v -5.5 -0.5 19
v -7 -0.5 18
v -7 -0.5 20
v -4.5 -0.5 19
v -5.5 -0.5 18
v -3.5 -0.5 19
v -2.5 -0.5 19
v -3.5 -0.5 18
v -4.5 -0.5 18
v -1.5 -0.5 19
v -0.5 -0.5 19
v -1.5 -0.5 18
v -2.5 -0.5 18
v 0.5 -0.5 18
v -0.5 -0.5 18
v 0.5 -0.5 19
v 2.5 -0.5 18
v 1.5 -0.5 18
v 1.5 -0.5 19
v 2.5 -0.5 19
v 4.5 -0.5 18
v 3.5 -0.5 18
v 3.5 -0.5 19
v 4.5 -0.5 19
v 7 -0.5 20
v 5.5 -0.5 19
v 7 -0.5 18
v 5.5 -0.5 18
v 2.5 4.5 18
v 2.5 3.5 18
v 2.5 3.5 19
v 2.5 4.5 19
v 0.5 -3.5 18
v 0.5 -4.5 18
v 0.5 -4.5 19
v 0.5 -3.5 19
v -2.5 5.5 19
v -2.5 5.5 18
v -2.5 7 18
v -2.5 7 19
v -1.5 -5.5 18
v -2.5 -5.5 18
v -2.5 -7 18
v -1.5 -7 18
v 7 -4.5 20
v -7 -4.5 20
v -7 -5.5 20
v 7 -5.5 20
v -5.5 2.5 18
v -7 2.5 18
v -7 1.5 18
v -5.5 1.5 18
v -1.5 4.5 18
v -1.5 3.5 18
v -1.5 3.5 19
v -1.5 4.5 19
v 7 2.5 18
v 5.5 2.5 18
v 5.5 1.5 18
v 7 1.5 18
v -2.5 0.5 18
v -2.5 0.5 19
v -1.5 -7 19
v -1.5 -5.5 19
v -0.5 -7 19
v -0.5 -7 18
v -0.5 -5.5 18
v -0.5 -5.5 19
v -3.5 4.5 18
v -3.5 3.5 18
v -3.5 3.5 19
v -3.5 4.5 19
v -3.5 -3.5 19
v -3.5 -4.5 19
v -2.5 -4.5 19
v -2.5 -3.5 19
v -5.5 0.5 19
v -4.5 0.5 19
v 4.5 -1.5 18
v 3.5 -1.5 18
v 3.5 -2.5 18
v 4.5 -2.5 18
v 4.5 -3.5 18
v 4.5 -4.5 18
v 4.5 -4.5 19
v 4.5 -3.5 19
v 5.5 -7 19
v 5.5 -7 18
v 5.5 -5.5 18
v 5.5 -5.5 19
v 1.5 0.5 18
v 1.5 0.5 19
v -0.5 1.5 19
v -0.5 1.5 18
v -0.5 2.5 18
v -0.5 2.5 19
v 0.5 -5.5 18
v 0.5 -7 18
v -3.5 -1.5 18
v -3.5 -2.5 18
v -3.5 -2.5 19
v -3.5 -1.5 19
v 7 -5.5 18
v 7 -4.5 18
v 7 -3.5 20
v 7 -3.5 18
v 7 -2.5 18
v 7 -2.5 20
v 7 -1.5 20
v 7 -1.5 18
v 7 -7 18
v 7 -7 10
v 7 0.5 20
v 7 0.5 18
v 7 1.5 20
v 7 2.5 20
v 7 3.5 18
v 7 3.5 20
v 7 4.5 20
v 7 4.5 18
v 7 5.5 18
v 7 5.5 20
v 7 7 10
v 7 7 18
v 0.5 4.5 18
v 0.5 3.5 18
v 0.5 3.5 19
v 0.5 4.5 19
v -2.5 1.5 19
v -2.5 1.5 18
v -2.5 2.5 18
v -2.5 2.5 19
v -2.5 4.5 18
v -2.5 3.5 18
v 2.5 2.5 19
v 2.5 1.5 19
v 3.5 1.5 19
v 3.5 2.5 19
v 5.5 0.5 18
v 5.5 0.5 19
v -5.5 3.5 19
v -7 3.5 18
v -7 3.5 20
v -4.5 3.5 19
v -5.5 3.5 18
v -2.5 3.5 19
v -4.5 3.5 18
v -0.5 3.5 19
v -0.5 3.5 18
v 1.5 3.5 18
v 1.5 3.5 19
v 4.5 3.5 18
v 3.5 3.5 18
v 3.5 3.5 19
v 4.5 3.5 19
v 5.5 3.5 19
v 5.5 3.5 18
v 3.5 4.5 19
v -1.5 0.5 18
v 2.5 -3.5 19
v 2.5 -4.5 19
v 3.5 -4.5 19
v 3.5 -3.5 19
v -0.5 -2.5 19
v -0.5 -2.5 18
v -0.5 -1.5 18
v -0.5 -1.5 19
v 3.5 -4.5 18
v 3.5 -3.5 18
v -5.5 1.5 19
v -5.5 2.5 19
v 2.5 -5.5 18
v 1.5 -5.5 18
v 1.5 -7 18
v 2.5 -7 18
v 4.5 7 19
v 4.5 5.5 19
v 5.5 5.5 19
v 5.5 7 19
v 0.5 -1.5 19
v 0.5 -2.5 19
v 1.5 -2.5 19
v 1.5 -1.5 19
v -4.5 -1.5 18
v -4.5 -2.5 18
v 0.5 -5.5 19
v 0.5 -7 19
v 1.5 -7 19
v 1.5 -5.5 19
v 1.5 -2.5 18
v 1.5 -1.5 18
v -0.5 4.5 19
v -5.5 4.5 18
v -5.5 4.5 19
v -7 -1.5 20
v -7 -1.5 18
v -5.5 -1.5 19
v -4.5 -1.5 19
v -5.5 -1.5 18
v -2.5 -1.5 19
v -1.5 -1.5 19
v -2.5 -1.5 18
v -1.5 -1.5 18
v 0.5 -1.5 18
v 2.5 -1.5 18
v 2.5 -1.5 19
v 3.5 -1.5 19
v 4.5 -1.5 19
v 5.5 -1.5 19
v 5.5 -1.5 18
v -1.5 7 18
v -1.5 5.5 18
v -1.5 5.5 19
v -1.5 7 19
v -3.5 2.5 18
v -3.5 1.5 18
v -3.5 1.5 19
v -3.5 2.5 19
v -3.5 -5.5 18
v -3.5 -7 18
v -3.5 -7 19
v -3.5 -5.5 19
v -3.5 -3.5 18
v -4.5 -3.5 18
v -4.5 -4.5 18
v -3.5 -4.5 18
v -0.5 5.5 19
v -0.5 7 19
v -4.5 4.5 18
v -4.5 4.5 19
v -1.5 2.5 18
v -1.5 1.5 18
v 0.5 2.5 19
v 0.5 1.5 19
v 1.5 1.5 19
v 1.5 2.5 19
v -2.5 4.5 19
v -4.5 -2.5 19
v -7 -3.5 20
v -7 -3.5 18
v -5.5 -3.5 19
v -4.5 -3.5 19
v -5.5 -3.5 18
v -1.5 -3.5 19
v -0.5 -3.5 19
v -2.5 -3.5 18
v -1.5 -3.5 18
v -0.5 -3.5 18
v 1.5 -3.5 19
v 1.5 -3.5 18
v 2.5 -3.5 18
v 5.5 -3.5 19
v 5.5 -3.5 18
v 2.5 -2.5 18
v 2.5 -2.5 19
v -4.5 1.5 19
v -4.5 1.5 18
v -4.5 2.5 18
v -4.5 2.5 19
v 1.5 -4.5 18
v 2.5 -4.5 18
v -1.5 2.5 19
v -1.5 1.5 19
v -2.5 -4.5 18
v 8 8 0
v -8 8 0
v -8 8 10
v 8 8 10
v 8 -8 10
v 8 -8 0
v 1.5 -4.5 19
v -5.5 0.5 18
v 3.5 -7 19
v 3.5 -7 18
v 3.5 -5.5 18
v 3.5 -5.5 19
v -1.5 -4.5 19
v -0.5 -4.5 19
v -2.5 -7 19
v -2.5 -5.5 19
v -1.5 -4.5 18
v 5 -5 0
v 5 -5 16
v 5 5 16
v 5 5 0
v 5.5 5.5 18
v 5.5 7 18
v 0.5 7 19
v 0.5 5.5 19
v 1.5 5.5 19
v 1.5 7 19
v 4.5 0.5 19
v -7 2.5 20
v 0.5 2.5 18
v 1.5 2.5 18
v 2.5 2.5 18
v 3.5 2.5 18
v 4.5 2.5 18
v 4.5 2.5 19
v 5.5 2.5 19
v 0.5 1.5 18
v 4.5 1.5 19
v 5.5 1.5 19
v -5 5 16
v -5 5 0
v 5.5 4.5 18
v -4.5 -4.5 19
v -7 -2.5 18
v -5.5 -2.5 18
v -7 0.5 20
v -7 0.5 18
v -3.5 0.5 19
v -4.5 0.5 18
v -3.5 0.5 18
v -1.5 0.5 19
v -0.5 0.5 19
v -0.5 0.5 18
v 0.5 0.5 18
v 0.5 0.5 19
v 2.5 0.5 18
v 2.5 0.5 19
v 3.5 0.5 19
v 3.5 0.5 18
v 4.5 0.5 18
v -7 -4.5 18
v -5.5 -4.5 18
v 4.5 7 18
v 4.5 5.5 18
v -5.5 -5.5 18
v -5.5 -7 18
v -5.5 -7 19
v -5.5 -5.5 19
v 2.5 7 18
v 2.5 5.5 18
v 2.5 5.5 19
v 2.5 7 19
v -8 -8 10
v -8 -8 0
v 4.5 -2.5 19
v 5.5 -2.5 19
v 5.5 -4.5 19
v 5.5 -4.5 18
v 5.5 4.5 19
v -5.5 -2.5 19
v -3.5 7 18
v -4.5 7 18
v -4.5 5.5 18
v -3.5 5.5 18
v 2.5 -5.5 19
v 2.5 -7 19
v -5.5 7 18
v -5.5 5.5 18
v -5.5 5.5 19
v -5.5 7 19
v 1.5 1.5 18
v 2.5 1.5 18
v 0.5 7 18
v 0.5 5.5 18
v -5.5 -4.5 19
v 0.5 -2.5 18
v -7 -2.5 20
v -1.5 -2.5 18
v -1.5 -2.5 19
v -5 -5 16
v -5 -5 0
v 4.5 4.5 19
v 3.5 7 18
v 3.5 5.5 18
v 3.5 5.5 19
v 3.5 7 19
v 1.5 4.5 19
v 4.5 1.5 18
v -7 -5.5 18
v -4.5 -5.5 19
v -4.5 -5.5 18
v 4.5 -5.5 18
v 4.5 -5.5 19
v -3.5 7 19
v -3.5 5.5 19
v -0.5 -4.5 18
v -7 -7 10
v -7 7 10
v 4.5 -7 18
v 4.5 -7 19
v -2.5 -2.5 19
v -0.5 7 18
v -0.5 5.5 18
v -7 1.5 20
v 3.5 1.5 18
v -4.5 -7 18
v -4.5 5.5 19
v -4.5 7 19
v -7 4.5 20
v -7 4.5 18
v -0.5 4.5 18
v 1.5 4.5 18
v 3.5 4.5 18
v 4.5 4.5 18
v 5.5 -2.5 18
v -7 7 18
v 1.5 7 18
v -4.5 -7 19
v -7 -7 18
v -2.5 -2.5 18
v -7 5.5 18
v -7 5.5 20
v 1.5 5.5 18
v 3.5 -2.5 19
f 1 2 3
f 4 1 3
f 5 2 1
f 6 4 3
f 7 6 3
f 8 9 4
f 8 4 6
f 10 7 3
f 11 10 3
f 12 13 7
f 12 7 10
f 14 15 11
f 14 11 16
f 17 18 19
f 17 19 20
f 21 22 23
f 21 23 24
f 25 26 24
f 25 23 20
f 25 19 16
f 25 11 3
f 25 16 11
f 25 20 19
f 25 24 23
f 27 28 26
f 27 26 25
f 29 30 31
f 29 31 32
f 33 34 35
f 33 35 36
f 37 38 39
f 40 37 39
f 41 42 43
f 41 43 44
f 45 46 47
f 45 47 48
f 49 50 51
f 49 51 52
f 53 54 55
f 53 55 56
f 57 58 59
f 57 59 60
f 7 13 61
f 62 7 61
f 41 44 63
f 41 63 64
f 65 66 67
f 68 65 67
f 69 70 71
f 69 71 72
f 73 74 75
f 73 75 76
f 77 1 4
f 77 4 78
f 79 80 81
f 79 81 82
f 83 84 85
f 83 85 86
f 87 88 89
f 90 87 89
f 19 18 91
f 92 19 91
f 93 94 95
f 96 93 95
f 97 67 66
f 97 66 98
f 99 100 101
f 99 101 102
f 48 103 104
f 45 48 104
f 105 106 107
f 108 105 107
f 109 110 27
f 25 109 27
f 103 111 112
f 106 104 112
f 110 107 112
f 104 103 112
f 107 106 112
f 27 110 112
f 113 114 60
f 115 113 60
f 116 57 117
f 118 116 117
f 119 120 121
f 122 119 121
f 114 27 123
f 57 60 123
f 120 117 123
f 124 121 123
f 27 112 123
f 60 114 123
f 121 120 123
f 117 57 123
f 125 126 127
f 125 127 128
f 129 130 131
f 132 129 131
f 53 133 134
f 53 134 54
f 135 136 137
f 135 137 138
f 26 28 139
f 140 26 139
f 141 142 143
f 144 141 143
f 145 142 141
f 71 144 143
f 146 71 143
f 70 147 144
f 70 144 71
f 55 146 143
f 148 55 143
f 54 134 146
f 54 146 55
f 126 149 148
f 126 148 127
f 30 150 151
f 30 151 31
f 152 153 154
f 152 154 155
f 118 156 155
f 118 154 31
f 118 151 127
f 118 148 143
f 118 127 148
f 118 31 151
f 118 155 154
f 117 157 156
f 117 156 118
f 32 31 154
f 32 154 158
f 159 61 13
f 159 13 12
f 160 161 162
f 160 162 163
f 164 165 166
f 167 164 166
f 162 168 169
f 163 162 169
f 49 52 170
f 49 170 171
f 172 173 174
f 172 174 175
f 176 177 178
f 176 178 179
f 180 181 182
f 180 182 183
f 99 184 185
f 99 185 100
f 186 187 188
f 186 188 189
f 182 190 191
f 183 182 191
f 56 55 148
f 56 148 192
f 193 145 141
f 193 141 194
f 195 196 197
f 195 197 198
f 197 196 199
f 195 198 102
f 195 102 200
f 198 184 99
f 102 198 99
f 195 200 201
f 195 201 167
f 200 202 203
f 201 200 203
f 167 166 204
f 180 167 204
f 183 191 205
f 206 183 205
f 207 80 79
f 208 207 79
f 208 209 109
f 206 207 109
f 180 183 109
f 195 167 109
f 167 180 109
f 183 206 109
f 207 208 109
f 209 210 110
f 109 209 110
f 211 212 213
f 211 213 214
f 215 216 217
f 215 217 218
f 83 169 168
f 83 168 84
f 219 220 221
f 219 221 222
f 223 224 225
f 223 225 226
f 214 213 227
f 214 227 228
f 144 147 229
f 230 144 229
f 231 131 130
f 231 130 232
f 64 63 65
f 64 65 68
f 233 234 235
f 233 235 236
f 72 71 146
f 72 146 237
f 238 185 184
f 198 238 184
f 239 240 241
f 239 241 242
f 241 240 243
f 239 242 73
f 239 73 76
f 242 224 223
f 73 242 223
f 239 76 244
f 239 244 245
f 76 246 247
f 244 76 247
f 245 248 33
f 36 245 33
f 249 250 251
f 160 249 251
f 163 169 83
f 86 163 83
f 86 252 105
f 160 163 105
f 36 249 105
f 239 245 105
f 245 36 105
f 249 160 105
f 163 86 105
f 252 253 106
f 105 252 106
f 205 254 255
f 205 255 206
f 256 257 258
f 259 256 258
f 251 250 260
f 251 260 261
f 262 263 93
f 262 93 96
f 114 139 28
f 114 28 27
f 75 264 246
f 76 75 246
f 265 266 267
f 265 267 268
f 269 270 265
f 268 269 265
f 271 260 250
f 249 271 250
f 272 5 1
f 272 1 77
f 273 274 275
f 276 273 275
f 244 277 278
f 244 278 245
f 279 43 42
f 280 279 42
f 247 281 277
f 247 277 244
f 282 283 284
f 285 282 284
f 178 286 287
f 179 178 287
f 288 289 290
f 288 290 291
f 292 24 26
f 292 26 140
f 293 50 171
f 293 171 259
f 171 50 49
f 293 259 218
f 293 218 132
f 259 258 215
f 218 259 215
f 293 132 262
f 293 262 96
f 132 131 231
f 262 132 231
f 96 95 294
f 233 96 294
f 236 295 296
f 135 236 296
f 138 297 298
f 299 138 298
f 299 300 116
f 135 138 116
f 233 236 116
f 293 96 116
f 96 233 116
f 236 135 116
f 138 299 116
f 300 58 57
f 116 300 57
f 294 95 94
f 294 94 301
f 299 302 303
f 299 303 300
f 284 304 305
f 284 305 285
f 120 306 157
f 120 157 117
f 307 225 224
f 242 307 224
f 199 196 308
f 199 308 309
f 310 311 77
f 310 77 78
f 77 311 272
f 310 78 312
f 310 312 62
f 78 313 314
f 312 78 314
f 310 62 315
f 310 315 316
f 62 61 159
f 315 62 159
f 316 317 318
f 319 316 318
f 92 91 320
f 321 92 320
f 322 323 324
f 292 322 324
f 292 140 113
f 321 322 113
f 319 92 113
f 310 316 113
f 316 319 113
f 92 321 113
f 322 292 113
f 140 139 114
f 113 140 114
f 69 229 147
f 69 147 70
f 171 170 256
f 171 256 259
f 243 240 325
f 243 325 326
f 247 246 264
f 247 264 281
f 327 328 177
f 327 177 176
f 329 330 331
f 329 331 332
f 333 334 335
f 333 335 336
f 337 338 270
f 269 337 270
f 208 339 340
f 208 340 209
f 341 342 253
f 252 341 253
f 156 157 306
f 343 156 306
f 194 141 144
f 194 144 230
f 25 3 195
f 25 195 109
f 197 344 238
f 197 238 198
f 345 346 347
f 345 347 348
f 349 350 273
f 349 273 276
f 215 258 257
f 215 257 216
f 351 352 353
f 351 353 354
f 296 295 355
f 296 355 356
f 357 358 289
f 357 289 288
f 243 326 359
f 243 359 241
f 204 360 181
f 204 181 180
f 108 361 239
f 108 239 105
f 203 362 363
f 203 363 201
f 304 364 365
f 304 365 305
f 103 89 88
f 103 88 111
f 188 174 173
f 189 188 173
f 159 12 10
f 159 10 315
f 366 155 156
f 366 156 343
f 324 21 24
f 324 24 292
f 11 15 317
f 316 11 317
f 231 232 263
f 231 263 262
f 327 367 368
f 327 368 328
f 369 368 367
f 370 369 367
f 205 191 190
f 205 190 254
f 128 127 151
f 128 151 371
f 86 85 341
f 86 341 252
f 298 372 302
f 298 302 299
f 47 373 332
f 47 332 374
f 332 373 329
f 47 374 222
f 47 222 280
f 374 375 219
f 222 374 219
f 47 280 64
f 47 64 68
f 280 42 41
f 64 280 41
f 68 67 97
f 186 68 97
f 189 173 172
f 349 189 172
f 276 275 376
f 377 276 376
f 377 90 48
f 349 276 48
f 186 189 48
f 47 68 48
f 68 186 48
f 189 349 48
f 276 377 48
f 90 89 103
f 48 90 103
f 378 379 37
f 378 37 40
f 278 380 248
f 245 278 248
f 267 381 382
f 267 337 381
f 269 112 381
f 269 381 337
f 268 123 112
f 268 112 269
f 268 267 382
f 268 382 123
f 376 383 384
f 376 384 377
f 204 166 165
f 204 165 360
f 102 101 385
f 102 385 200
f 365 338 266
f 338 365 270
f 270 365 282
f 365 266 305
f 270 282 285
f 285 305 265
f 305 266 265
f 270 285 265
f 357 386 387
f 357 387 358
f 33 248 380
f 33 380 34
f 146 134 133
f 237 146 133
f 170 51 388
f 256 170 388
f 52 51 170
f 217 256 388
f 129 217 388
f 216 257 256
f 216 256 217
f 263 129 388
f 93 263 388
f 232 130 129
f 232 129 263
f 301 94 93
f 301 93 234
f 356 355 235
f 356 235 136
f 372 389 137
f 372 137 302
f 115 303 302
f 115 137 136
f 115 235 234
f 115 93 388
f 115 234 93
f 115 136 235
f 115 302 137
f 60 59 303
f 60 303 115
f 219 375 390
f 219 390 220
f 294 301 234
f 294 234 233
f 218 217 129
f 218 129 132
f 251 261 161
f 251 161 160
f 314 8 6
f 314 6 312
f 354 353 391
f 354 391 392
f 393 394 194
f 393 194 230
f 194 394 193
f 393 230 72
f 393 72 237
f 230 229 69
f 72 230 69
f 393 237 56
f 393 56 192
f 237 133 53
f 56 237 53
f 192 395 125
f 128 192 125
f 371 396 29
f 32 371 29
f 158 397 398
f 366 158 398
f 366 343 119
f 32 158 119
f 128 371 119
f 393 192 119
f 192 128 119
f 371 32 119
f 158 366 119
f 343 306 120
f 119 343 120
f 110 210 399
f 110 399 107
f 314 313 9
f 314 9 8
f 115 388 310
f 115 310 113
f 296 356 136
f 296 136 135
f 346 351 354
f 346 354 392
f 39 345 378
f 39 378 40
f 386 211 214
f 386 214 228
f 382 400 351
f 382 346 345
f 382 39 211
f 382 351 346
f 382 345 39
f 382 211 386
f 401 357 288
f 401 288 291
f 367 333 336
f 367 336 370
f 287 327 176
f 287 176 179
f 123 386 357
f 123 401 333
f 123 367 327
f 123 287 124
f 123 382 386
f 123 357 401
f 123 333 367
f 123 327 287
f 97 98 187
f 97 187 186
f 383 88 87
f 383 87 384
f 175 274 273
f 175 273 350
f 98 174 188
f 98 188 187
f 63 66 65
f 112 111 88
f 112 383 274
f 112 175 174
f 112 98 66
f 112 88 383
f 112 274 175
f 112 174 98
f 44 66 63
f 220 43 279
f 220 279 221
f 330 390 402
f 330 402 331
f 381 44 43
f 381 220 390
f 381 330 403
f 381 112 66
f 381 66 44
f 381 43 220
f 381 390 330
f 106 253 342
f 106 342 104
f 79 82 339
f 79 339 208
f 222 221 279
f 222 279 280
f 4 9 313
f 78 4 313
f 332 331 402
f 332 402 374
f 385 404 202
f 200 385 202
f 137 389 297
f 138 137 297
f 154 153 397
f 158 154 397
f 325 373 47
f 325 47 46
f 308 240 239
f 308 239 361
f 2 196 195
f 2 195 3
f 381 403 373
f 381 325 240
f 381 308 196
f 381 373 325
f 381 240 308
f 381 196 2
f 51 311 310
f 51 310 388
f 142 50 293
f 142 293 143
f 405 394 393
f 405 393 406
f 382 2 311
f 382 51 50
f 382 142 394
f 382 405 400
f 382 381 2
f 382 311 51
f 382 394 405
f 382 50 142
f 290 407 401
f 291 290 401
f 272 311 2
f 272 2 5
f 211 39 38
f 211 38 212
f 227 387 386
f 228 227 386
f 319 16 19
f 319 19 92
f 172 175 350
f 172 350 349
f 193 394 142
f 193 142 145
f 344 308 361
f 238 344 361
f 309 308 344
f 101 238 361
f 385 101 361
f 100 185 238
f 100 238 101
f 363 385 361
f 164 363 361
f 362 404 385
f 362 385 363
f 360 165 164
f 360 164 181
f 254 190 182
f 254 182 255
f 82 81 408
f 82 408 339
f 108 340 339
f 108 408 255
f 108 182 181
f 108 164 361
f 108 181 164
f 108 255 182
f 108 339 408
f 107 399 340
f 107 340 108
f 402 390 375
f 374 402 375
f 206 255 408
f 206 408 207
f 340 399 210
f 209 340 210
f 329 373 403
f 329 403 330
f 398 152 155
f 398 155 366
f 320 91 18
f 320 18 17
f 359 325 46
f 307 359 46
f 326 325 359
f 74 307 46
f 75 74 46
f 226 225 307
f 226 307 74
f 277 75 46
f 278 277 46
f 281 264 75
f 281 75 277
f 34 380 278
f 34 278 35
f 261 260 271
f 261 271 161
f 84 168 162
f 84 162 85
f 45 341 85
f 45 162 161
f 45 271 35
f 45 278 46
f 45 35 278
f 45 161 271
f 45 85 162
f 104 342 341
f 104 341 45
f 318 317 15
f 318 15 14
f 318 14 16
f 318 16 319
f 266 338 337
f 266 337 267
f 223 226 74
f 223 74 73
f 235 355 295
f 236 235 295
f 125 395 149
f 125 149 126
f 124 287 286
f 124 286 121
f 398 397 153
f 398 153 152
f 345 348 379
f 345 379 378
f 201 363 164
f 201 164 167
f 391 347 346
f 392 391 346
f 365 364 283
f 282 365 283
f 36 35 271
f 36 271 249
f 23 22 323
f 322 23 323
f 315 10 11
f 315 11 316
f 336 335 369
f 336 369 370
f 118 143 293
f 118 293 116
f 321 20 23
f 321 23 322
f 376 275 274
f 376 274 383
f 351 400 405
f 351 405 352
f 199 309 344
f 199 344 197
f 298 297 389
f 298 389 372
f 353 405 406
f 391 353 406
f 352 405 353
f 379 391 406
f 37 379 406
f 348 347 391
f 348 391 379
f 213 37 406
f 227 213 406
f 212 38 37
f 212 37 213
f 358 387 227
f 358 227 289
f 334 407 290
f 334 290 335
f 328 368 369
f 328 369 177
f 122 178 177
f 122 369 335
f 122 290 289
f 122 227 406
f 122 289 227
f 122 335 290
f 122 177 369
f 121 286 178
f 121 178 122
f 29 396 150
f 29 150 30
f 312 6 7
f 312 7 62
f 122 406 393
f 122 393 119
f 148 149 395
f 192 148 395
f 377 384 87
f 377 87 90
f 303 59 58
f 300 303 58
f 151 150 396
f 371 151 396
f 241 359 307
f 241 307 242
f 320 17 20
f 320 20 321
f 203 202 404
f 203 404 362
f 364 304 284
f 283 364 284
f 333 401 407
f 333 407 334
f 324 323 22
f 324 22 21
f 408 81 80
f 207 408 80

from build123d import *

# Parameters (mm, degrees)
BOX003_W     = 10
BOX003_H     = 10
BOX003_DEPTH = 16
BOX_W        = 16
BOX_H        = 16
BOX_DEPTH    = 10
BOX002_W     = 14
BOX002_H     = 14
BOX002_DEPTH = 18
SKETCH_W     = 14
SKETCH_H     = 1
PAD_DEPTH    = 2
SKETCH001_W  = 14
SKETCH001_H  = 1
PAD001_DEPTH = 1


with BuildPart() as cube001:
    # Box003 → Box003 (new body)
    with BuildSketch(Plane(origin=(-5, -5, 0), x_dir=(1, 0, 0), z_dir=(0, 0, 1))):
        with Locations((5, 5)):
            Rectangle(BOX003_W, BOX003_H)
    extrude(amount=BOX003_DEPTH)


with BuildPart() as cube:
    # Box → Box (new body)
    with BuildSketch(Plane(origin=(-8, -8, 0), x_dir=(1, 0, 0), z_dir=(0, 0, 1))):
        with Locations((8, 8)):
            Rectangle(BOX_W, BOX_H)
    extrude(amount=BOX_DEPTH)


with BuildPart() as cut:
    # Box002 → Box002 (join)
    with BuildSketch(Plane(origin=(-7, -7, 0), x_dir=(1, 0, 0), z_dir=(0, 0, 1))):
        with Locations((7, 7)):
            Rectangle(BOX002_W, BOX002_H)
    extrude(amount=BOX002_DEPTH)

    # Sketch (on Face6 of Box002) → Pad (join)
    with BuildSketch(Plane(origin=(-7, -7, 18), x_dir=(1, 0, 0), z_dir=(0, 0, 1))):
        with Locations((7, 10)):
            Rectangle(SKETCH_W, SKETCH_H)
        with Locations((7, 8)):
            Rectangle(SKETCH_W, SKETCH_H)
        with Locations((7, 6)):
            Rectangle(SKETCH_W, SKETCH_H)
        with Locations((7, 4)):
            Rectangle(SKETCH_W, SKETCH_H)
        with Locations((7, 2)):
            Rectangle(SKETCH_W, SKETCH_H)
        with Locations((7, 12)):
            Rectangle(SKETCH_W, SKETCH_H)
    extrude(amount=PAD_DEPTH)

    # Sketch001 (on Face6 of Box002) → Pad001 (join)
    with BuildSketch(Plane(origin=(7, -7, 18), x_dir=(0, 1, 0), z_dir=(0, 0, 1))):
        with Locations((7, 10)):
            Rectangle(SKETCH001_W, SKETCH001_H)
        with Locations((7, 8)):
            Rectangle(SKETCH001_W, SKETCH001_H)
        with Locations((7, 6)):
            Rectangle(SKETCH001_W, SKETCH001_H)
        with Locations((7, 4)):
            Rectangle(SKETCH001_W, SKETCH001_H)
        with Locations((7, 2)):
            Rectangle(SKETCH001_W, SKETCH001_H)
        with Locations((7, 12)):
            Rectangle(SKETCH001_W, SKETCH001_H)
    extrude(amount=PAD001_DEPTH)

    # Fusion: union Cube
    add(cube.part)

    # Cut: cut Cube001
    add(cube001.part, mode=Mode.SUBTRACT)


solid = cut.part
